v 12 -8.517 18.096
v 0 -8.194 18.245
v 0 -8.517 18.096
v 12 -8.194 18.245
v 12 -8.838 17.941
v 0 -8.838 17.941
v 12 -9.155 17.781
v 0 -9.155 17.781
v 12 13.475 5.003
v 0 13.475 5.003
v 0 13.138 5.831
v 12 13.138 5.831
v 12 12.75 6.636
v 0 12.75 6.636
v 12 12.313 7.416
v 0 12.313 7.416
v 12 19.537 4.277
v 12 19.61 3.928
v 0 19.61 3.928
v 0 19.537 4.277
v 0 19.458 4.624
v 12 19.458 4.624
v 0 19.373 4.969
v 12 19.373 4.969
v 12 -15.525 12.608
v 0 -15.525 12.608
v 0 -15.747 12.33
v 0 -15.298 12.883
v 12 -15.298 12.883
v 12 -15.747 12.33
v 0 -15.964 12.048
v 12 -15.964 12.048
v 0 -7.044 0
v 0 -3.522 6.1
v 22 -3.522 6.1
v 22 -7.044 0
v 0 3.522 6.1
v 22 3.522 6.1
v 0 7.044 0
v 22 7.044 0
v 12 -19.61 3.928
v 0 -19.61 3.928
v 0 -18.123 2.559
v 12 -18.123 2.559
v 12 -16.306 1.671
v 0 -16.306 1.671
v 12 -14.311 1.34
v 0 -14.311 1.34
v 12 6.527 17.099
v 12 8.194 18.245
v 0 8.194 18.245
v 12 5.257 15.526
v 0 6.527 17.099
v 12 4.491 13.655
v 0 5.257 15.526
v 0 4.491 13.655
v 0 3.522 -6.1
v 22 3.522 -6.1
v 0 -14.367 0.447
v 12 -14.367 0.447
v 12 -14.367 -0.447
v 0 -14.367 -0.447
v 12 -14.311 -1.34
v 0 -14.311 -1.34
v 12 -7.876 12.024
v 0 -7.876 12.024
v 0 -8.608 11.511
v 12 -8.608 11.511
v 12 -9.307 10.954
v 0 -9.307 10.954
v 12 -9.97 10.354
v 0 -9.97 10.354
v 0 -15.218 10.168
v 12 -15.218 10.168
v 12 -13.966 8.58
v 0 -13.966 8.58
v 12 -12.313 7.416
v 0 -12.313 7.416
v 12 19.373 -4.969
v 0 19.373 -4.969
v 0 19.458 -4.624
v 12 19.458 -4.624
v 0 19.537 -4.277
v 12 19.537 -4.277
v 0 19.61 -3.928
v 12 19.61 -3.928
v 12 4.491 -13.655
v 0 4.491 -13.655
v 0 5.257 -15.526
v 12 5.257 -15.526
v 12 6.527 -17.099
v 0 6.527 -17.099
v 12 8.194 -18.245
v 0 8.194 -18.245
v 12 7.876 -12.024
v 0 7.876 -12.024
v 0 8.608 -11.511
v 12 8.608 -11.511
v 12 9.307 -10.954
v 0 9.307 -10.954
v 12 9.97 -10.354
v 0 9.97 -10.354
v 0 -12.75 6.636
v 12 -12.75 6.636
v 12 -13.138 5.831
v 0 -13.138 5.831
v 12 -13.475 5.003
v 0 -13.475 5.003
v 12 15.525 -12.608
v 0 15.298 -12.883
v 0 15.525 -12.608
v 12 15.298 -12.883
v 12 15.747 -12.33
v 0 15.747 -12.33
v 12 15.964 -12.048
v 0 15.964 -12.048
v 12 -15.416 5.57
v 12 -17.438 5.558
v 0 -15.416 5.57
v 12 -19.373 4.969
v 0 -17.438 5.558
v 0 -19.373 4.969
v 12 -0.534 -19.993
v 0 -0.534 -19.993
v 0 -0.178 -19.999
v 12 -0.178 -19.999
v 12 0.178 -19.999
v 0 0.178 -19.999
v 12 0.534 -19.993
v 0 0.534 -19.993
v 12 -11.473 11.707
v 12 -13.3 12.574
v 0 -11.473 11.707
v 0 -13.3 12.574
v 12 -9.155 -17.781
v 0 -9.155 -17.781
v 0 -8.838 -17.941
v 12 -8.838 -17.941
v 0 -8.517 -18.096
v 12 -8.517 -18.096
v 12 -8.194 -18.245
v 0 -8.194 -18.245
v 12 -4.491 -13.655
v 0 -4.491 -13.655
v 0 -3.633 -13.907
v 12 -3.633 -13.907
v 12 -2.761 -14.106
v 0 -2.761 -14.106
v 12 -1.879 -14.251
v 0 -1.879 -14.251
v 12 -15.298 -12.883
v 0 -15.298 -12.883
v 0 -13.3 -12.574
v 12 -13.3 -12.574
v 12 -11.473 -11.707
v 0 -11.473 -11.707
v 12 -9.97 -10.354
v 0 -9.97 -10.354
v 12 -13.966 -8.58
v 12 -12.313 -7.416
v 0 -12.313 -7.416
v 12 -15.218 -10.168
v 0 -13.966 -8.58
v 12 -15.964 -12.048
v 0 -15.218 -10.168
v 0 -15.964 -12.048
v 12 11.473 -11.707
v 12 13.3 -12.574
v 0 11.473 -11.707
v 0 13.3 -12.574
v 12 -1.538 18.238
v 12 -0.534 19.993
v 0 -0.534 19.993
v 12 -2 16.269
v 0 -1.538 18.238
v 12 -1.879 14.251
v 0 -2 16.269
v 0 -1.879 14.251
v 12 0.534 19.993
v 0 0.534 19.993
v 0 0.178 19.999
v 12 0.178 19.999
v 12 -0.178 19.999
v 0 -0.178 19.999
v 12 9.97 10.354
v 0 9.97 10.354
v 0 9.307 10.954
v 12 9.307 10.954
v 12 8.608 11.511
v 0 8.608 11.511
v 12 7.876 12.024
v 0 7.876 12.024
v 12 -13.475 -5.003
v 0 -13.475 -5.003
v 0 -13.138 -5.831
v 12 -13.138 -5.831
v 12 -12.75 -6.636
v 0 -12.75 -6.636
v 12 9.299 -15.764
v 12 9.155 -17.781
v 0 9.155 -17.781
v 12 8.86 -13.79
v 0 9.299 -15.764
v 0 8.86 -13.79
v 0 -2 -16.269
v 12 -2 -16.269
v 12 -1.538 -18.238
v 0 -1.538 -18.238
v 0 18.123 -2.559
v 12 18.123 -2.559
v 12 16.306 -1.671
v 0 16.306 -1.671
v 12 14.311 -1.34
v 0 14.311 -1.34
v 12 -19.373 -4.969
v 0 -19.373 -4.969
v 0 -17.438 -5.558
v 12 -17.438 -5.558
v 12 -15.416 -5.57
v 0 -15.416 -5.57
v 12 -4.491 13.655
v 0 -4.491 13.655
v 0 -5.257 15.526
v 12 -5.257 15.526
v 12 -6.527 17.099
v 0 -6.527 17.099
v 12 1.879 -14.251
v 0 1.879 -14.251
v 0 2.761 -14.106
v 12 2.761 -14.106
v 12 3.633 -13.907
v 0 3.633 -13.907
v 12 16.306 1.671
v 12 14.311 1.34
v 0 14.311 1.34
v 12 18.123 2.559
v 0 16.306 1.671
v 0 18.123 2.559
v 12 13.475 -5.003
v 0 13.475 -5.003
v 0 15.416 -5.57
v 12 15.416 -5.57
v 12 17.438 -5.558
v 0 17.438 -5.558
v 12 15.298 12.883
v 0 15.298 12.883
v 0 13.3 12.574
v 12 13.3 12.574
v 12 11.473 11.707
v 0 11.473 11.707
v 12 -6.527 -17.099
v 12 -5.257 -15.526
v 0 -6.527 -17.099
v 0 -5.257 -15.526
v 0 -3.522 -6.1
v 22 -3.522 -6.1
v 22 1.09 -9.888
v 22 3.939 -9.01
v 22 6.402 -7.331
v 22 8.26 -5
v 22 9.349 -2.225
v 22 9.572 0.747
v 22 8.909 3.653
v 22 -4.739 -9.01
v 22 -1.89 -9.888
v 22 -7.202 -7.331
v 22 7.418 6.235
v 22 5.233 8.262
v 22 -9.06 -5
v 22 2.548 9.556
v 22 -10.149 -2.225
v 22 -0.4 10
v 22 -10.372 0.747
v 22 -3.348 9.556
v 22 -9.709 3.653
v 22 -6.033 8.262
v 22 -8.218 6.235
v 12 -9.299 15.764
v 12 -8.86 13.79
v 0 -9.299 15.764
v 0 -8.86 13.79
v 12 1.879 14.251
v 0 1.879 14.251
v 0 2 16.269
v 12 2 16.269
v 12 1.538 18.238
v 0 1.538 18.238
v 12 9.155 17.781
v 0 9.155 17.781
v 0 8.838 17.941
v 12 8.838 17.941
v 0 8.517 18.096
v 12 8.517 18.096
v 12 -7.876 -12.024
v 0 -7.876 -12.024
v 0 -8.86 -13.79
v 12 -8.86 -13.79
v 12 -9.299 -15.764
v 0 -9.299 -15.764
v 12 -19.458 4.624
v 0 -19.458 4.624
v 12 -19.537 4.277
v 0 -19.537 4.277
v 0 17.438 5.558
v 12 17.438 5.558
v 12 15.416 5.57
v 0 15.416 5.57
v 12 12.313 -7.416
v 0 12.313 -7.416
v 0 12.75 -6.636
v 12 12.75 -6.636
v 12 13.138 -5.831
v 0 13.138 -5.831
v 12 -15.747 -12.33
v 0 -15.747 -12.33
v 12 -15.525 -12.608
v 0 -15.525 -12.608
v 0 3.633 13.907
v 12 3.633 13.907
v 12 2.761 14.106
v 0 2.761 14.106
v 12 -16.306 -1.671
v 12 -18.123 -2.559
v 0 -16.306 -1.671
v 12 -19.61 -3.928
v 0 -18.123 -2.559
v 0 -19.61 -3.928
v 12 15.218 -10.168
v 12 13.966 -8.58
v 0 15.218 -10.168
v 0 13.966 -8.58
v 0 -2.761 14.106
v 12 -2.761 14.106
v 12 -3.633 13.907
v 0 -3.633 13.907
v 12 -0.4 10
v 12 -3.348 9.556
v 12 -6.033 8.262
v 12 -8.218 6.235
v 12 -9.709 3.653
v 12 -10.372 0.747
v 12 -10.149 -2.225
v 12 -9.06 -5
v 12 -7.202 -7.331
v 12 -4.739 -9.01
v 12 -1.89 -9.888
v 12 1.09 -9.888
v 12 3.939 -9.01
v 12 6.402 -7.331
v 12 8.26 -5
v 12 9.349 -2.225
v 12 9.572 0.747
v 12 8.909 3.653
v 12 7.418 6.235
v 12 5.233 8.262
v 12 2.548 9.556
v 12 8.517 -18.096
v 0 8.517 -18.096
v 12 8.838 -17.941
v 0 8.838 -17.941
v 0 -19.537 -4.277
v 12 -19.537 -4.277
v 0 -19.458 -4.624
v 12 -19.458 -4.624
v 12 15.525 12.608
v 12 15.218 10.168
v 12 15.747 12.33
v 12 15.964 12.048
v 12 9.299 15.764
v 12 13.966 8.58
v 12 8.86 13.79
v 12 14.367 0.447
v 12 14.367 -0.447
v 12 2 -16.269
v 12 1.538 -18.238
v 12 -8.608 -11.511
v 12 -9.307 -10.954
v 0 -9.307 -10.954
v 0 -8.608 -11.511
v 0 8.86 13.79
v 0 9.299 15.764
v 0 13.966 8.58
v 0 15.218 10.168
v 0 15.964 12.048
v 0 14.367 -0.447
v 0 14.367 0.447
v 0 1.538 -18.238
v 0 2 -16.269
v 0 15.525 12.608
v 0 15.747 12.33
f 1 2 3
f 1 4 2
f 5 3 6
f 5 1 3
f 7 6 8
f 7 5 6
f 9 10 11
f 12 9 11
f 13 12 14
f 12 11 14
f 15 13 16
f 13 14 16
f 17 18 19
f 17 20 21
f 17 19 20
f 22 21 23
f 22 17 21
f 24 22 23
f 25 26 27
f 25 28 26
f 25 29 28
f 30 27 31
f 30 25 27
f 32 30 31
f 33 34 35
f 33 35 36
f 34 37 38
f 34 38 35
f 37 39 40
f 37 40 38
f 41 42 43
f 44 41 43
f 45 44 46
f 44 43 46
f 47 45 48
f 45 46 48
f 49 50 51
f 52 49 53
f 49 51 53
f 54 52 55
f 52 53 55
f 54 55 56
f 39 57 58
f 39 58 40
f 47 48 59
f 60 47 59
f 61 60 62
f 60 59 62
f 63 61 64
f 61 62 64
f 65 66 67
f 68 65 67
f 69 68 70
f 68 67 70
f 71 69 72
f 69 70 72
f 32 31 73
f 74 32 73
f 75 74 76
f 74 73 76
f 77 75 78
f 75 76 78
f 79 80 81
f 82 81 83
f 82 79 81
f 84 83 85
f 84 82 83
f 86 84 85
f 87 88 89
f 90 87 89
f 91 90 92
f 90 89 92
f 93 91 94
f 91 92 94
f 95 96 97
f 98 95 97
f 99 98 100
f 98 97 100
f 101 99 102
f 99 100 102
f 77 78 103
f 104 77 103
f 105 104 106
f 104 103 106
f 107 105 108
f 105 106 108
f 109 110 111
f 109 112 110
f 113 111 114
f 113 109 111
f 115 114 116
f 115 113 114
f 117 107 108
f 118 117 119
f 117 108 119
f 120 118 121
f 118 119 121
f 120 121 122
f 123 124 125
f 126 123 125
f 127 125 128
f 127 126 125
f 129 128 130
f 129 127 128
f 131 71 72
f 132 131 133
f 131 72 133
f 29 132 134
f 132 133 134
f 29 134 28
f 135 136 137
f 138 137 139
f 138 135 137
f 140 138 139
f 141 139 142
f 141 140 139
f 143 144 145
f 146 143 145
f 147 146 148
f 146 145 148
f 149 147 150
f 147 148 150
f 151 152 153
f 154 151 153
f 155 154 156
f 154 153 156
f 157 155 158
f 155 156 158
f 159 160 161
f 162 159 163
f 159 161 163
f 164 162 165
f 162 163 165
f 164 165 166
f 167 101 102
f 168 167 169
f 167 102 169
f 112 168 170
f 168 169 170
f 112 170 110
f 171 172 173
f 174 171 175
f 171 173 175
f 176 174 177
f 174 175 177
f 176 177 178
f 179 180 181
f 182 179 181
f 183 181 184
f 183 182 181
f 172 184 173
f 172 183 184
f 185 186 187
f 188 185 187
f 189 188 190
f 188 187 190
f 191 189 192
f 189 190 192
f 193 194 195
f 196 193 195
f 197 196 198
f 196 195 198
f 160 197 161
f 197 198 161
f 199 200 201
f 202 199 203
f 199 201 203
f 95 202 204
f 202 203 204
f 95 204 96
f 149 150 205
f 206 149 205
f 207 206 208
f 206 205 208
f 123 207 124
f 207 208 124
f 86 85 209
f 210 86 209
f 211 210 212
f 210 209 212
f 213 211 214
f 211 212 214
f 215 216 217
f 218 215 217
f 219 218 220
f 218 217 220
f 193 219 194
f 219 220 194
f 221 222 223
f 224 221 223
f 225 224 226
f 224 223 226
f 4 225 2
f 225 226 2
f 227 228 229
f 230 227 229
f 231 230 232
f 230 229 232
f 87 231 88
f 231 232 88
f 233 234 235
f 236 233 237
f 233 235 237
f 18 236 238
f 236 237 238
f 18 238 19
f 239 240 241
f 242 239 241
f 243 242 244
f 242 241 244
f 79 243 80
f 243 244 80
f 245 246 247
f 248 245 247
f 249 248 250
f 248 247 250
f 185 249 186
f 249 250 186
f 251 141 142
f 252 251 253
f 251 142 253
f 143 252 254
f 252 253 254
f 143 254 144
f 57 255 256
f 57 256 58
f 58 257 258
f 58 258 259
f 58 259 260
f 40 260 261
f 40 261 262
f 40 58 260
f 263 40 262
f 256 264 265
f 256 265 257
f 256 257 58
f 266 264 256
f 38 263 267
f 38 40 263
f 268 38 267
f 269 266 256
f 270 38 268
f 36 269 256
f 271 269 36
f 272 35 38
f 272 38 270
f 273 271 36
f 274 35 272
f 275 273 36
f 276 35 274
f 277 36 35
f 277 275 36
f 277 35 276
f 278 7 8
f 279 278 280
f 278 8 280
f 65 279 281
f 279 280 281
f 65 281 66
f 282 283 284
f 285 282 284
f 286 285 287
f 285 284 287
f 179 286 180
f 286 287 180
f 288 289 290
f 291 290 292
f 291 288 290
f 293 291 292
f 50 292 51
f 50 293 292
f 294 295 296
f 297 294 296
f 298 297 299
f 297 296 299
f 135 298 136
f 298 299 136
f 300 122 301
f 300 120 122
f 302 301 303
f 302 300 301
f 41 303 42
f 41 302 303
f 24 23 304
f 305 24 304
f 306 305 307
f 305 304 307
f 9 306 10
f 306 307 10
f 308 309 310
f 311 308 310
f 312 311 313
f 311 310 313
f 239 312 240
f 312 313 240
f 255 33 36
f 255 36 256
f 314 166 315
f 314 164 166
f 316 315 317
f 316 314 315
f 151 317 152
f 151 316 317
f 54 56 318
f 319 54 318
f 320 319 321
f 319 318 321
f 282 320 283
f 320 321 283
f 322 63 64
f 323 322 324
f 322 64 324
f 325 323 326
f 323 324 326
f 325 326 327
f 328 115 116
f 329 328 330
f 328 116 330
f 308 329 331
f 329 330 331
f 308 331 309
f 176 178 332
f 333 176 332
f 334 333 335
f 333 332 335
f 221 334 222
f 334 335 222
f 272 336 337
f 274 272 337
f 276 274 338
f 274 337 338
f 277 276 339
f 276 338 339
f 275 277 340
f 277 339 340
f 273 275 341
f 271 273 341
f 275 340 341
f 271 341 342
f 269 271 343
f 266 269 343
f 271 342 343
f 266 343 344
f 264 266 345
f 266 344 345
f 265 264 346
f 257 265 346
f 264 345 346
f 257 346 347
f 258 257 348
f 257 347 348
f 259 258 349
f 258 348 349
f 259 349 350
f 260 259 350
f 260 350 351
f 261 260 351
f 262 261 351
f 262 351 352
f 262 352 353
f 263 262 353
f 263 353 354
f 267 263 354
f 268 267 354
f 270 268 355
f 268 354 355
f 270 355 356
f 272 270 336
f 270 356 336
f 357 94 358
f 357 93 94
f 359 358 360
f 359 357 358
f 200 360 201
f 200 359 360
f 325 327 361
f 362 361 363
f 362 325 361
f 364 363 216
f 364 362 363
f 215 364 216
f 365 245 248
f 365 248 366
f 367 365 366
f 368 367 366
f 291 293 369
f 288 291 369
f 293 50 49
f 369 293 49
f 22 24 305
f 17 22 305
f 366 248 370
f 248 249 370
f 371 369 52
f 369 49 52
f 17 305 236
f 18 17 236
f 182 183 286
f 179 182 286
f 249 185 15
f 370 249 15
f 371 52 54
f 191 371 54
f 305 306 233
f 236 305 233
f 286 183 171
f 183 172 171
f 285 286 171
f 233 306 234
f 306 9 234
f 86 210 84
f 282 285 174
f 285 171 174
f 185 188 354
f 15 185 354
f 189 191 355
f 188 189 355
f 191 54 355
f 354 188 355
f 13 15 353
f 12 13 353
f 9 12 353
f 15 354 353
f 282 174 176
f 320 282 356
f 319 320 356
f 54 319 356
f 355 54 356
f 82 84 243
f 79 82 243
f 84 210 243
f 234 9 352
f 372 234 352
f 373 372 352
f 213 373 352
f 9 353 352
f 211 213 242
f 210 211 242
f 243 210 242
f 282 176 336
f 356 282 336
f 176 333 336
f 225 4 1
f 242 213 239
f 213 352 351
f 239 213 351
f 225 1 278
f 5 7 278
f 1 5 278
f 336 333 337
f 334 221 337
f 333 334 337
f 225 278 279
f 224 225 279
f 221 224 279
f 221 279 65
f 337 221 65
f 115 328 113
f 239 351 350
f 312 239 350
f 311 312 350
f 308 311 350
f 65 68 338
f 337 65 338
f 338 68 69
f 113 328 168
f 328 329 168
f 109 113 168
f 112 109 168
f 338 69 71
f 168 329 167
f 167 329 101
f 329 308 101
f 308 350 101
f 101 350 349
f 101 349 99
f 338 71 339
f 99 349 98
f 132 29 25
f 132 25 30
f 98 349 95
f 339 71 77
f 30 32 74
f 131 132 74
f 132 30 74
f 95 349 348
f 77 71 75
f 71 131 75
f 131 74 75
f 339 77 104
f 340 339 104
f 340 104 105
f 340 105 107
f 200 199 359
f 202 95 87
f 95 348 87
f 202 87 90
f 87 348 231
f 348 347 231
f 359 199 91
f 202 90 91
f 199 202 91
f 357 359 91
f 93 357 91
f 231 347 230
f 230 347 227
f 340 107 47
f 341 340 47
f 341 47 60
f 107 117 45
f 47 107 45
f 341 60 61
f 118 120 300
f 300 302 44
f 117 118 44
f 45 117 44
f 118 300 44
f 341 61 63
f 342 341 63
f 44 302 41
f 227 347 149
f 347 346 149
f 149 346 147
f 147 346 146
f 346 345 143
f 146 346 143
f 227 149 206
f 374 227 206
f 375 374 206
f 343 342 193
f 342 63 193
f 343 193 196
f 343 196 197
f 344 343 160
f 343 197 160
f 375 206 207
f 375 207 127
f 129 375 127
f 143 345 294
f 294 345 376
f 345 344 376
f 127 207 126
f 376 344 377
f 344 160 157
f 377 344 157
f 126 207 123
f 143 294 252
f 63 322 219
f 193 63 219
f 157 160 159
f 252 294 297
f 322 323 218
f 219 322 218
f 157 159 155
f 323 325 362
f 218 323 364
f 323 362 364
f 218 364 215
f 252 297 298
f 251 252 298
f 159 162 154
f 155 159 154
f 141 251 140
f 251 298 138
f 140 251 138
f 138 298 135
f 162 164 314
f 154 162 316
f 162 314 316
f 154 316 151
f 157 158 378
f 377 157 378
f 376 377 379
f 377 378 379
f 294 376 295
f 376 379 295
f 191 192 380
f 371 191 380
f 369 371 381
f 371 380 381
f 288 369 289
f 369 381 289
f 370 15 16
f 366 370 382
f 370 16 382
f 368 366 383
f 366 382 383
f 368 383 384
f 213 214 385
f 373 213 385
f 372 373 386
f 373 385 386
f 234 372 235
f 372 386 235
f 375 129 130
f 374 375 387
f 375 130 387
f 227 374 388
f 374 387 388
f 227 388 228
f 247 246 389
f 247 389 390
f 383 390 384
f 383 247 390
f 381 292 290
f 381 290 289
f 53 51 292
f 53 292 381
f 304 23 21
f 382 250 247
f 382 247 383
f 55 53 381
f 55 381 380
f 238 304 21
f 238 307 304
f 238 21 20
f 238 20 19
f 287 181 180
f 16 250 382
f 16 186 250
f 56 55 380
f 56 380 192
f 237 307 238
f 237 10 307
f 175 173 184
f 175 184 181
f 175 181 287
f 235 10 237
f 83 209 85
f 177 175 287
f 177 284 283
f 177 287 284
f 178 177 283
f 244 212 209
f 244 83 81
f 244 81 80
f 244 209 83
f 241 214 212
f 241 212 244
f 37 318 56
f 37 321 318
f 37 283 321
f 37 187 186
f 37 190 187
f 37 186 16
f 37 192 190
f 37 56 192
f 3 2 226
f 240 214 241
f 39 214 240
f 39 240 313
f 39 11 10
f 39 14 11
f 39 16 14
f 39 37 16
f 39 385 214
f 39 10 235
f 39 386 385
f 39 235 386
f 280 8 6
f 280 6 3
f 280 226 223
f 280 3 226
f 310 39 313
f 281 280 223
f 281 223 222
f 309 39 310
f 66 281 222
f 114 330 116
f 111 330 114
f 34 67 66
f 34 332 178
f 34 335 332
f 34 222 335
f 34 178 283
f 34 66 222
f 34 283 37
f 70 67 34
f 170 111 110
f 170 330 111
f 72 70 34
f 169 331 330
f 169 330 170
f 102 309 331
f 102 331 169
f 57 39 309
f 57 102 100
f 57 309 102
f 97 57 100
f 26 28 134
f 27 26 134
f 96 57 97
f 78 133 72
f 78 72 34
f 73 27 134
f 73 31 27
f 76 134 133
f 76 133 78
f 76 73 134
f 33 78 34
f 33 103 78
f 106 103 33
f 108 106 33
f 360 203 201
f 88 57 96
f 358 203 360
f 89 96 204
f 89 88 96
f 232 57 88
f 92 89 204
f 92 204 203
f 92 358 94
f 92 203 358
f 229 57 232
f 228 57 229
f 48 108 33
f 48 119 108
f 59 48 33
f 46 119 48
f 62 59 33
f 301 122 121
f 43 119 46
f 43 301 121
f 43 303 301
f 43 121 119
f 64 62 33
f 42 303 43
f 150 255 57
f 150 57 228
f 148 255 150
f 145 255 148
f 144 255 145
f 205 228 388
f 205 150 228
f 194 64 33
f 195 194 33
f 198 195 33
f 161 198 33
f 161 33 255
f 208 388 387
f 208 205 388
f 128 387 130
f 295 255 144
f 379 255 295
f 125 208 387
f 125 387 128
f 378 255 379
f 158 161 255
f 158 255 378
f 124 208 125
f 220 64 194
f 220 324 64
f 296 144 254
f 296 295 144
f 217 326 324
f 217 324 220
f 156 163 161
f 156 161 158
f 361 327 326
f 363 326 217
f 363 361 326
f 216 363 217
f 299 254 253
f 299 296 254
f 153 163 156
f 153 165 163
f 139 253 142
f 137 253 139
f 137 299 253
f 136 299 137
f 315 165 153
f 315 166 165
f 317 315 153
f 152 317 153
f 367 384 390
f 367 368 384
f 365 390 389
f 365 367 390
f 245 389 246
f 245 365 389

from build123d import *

# Parameters (mm, degrees)
BASPROSKE_W         = 12
BASPROSKE_H         = 20
TOOTHCUT_DEPTH      = 31.724582991
TEETHCUTS_COUNT     = 14
TEETHCUTS_ANGLE     = 334.285714286
BORSKE_R            = 0.4
BORE_DEPTH          = 50.0000508
SKETCH1_R           = 10
BOSS_EXTRUDE1_DEPTH = 10
CUT_EXTRUDE1_START  = -22
CUT_EXTRUDE1_DEPTH  = 22


with BuildPart() as part:
    # BasProSke → Base-Revolve (revolve)
    with BuildSketch(Plane(origin=(0, 0, 0), x_dir=(1, 0, 0), z_dir=(0, 1, 0)), mode=Mode.PRIVATE) as base_revolve_sk:
        with Locations((6, 10)):
            Rectangle(BASPROSKE_W, BASPROSKE_H)
    revolve(base_revolve_sk.sketch.rotate(Axis((-10, 0, 0), (1, 0, 0)), 180), axis=Axis((-10, 0, 0), (1, 0, 0)))

    # TooCutSke → ToothCut (cut, through all)
    with BuildSketch(Plane(origin=(0, 0, 0), x_dir=(0, 0, -1), z_dir=(1, 0, 0))):
        with BuildLine():
            ThreePointArc((1.339503949, 14.311450142), (0, 14.374), (-1.339503949, 14.311450142))
            ThreePointArc((-1.339503949, 14.311450142), (-2.055976555, 17.261705303), (-3.954182827, 19.631125371))
            ThreePointArc((-3.954182827, 19.631125371), (0, 20.0254), (3.954182827, 19.631125371))
            ThreePointArc((3.954182827, 19.631125371), (2.055976555, 17.261705303), (1.339503949, 14.311450142))
        make_face()
    toothcut = extrude(amount=TOOTHCUT_DEPTH, mode=Mode.SUBTRACT)

    # TeethCuts: ToothCut ×14 about axis
    teethcuts_axis = Axis((-10, 0, 0), (1, 0, 0))
    for i in range(1, TEETHCUTS_COUNT):
        add(toothcut.rotate(teethcuts_axis, i * TEETHCUTS_ANGLE / (TEETHCUTS_COUNT - 1)), mode=Mode.SUBTRACT)

    # BorSke → Bore (cut, symmetric)
    with BuildSketch(Plane(origin=(0, 0, 0), x_dir=(0, 0, -1), z_dir=(1, 0, 0))):
        with Locations(Location((0, 0, 0), (0, 0, 180))):
            Circle(BORSKE_R)
    extrude(amount=BORE_DEPTH, both=True, mode=Mode.SUBTRACT)

    # Sketch1 → Boss-Extrude1 (add)
    with BuildSketch(Plane(origin=(12, 0, 0), x_dir=(0, 0, -1), z_dir=(1, 0, 0))):
        with Locations(Location((0, -0.4, 0), (0, 0, 180))):
            Circle(SKETCH1_R)
    extrude(amount=BOSS_EXTRUDE1_DEPTH)

    # Sketch2 → Cut-Extrude1 (cut)
    with BuildSketch(Plane(origin=(22, 0, 0), x_dir=(0, 0, -1), z_dir=(1, 0, 0)).offset(CUT_EXTRUDE1_START)):
        Polygon((6.1, 3.521836642), (0, 7.043673284), (-6.1, 3.521836642), (-6.1, -3.521836642), (0, -7.043673284), (6.1, -3.521836642), align=None)
    extrude(amount=CUT_EXTRUDE1_DEPTH, mode=Mode.SUBTRACT)


solid = part.part
